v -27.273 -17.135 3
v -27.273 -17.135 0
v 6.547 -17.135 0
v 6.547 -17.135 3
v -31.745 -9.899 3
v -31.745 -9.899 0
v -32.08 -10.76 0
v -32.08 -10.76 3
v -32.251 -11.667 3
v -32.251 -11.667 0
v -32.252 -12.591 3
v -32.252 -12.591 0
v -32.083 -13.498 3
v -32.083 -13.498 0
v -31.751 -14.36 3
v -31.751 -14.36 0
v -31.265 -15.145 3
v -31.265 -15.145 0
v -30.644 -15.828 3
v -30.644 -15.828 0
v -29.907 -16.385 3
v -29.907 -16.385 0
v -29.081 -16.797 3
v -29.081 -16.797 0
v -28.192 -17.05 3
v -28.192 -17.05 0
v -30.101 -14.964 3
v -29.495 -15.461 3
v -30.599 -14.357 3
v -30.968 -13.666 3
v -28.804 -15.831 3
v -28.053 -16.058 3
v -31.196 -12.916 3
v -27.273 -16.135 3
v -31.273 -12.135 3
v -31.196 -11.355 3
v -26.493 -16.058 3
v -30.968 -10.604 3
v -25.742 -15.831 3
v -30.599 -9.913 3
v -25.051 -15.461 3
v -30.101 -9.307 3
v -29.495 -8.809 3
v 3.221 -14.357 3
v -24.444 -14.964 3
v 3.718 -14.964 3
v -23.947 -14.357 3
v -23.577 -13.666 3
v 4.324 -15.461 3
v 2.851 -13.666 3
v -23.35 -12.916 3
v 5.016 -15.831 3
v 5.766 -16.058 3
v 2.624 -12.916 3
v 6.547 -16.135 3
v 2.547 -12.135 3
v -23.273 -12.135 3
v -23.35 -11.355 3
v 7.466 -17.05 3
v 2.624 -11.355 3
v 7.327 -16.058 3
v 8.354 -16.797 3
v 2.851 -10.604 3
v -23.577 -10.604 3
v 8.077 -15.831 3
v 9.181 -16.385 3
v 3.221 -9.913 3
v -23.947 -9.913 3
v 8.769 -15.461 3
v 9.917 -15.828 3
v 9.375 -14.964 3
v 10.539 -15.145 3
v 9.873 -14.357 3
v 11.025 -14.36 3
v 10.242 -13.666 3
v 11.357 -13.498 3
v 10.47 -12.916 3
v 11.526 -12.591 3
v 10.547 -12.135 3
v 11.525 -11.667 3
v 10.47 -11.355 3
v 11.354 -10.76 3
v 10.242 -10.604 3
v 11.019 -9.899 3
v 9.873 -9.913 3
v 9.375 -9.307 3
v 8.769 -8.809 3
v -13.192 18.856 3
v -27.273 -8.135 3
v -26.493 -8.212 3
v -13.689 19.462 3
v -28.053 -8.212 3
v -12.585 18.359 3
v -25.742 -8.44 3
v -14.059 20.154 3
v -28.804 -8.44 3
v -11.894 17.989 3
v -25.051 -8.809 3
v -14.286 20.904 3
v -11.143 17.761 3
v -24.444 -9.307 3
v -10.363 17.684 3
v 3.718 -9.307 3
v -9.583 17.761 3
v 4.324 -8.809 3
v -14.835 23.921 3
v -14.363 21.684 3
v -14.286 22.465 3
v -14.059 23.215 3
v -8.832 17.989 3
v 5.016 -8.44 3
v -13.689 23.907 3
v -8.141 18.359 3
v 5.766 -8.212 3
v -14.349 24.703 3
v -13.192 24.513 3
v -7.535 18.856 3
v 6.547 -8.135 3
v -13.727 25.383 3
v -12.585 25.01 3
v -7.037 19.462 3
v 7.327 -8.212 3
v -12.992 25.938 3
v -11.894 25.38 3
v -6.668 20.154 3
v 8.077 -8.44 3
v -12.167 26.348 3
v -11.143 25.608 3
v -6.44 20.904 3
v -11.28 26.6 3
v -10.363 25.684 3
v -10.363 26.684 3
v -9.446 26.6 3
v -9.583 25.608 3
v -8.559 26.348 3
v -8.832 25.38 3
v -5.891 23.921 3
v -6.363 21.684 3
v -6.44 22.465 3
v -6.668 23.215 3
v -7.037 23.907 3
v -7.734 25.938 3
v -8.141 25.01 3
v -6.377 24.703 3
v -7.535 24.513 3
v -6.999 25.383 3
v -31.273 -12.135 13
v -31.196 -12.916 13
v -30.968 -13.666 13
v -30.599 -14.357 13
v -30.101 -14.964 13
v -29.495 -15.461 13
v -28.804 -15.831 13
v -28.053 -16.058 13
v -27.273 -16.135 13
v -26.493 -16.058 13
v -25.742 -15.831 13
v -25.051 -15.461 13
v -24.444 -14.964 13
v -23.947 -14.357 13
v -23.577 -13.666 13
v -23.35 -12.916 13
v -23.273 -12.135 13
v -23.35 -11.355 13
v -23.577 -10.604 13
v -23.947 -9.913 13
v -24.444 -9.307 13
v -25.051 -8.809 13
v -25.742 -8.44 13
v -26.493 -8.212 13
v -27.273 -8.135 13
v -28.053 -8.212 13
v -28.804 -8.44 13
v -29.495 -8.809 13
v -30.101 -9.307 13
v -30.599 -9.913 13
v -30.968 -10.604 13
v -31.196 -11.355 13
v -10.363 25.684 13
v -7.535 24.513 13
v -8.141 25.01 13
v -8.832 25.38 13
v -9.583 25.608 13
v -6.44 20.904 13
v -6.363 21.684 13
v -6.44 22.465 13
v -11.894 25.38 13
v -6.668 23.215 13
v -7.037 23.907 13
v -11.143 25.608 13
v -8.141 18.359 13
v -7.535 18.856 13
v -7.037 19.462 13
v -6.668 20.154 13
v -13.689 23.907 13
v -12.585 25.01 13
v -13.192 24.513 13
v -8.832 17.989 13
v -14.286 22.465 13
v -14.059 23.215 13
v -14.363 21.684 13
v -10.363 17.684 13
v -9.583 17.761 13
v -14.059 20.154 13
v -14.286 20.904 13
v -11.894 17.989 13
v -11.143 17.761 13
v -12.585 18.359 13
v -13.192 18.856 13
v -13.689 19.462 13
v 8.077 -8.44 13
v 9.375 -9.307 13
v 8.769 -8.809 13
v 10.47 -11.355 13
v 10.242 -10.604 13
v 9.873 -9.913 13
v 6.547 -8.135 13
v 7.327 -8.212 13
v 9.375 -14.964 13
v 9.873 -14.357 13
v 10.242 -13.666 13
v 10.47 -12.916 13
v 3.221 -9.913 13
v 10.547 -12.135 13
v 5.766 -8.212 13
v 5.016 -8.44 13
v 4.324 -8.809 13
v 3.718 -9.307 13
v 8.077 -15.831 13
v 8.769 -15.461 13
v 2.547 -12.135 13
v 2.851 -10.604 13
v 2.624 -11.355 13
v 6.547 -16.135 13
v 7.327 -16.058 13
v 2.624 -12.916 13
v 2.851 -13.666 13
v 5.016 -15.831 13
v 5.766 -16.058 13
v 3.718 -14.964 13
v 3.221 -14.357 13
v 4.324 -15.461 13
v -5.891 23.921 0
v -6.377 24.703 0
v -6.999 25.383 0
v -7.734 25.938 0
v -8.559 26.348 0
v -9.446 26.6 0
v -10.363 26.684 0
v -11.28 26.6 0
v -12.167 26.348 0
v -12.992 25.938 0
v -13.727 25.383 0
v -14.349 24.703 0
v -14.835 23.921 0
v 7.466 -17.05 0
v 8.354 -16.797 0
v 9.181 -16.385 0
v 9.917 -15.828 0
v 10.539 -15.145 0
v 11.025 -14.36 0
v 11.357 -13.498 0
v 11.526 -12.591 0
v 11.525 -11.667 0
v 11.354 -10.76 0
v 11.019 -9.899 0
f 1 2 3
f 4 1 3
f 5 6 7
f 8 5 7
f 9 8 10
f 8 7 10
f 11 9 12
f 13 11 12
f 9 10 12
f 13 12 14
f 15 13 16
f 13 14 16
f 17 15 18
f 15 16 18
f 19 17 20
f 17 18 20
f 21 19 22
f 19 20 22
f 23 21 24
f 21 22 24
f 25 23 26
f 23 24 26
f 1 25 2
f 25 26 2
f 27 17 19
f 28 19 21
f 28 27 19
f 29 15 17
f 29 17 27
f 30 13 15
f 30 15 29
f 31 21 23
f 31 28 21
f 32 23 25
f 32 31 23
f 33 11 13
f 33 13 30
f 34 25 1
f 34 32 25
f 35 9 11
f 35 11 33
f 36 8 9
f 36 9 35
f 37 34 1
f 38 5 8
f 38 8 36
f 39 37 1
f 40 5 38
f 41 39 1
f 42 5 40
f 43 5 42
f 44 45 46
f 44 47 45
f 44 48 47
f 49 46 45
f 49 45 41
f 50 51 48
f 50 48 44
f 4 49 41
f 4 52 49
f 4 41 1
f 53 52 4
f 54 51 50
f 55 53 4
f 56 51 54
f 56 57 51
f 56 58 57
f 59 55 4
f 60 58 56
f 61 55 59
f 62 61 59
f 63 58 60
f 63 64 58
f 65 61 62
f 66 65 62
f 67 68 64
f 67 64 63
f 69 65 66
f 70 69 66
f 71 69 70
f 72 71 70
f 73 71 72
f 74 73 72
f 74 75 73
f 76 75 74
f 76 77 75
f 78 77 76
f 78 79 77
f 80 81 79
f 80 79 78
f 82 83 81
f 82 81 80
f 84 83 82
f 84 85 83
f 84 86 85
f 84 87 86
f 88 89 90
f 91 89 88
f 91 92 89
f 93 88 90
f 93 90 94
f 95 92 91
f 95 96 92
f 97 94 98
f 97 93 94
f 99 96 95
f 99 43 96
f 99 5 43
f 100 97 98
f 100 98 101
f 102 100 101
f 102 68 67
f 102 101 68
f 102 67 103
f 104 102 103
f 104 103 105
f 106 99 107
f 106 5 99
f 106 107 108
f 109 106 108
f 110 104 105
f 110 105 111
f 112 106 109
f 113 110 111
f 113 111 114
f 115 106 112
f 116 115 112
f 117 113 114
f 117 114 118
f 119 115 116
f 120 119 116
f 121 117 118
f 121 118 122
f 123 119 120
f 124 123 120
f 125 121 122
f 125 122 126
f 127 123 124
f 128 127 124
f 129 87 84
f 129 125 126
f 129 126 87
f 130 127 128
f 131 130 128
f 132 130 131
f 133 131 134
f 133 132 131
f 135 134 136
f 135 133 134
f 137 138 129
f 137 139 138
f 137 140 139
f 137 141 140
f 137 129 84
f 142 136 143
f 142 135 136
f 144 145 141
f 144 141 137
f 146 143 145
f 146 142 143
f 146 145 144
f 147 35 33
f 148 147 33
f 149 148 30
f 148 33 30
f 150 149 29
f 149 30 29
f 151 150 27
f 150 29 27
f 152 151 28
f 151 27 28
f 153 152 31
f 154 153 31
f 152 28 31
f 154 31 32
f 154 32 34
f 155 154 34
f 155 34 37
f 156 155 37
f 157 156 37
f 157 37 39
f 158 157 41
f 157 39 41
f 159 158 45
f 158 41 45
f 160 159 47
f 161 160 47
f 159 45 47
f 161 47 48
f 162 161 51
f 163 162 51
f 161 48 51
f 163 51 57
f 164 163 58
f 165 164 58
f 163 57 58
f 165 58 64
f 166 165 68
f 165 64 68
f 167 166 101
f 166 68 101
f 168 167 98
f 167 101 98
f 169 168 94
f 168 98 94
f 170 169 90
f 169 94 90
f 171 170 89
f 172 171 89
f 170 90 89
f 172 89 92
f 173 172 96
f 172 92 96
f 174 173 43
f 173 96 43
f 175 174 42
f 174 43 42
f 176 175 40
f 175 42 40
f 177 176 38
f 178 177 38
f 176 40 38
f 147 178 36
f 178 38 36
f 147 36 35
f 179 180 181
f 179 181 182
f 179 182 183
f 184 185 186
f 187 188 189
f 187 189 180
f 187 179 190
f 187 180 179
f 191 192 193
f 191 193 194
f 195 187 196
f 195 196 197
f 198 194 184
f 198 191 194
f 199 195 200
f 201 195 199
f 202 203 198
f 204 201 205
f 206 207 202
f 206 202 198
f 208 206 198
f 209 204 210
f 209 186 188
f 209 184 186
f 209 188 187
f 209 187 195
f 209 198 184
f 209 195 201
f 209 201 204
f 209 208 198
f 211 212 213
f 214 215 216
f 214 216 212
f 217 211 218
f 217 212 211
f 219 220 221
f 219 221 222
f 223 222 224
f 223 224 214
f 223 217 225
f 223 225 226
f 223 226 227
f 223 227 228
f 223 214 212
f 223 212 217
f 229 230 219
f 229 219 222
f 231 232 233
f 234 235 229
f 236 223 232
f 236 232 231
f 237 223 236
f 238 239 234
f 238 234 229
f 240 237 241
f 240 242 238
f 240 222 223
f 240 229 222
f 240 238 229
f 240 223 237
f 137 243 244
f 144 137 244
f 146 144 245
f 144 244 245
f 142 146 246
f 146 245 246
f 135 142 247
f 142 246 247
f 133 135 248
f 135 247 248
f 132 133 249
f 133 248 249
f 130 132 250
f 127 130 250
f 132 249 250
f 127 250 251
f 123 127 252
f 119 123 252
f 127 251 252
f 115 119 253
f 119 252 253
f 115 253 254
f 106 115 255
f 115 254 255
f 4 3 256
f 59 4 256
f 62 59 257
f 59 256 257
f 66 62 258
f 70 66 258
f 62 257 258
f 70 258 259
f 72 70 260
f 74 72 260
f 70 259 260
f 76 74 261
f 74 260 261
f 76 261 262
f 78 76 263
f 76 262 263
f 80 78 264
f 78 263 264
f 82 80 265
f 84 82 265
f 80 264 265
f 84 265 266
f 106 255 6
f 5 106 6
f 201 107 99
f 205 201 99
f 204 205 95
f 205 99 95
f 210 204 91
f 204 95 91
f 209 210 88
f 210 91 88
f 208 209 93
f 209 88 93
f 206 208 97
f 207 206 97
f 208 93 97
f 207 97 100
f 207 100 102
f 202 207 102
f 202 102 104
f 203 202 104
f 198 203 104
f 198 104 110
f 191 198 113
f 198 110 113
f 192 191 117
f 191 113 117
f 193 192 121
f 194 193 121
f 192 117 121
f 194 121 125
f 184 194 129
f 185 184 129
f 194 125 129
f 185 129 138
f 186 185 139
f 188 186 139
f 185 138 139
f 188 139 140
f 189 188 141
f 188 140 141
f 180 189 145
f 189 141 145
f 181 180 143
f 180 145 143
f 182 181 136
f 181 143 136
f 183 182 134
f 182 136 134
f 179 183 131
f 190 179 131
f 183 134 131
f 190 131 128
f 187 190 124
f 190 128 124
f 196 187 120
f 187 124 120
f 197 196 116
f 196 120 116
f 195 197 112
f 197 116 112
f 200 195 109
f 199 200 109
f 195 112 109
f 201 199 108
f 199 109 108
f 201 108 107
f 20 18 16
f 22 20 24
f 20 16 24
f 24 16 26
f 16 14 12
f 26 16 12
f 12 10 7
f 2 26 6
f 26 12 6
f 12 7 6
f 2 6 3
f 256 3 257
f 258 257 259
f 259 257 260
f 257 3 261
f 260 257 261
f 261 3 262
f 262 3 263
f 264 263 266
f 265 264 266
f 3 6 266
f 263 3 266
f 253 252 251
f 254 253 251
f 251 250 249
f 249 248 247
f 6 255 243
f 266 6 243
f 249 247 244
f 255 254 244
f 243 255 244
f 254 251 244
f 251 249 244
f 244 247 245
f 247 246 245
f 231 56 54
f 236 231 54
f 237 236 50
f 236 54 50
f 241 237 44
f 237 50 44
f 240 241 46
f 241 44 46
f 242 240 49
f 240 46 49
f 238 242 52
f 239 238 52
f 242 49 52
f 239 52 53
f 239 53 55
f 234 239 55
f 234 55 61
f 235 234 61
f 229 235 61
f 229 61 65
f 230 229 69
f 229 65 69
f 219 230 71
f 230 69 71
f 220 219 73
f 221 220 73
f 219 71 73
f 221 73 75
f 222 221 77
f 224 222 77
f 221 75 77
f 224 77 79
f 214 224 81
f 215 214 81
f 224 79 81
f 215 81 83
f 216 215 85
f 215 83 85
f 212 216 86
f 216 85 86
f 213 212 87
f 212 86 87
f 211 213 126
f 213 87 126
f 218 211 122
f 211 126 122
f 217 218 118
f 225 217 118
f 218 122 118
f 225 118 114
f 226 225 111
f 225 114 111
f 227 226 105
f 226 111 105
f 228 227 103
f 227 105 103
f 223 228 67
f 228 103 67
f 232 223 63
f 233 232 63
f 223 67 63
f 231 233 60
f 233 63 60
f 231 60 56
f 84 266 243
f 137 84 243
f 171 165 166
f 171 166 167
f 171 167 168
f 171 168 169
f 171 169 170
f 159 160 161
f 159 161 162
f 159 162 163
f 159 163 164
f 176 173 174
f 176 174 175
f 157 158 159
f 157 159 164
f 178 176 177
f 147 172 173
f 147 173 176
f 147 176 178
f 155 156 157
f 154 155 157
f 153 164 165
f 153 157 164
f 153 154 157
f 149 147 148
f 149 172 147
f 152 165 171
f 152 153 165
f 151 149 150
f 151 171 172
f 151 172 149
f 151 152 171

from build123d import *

# Parameters (mm, degrees)
SALIENTE_EXTRUIR1_DEPTH = 3
CROQUIS2_R              = 4
SALIENTE_EXTRUIR2_DEPTH = 10


with BuildPart() as part:
    # Croquis1 → Saliente-Extruir1 (new body)
    with BuildSketch(Plane.XY):
        with BuildLine():
            Line((-27.272909543, -17.135189149), (6.546750569, -17.135189149))
            ThreePointArc((6.546750569, -17.135189149), (10.800004611, -14.76384471), (11.018886524, -9.899121172))
            Line((11.018886524, -9.899121172), (-5.890943532, 23.920538941))
            ThreePointArc((-5.890943532, 23.920538941), (-10.363079487, 26.684470963), (-14.835215442, 23.920538941))
            Line((-14.835215442, 23.920538941), (-31.745045498, -9.899121172))
            ThreePointArc((-31.745045498, -9.899121172), (-31.526163585, -14.76384471), (-27.272909543, -17.135189149))
        make_face()
    extrude(amount=SALIENTE_EXTRUIR1_DEPTH)

    # Croquis2 → Saliente-Extruir2 (add)
    with BuildSketch(Plane.XY.offset(3)):
        with Locations(Location((-10.363079487, 21.684470963, 0), (0, 0, 180))):
            Circle(CROQUIS2_R)
        with Locations(Location((-27.272909543, -12.135189149, 0), (0, 0, 180))):
            Circle(CROQUIS2_R)
        with Locations(Location((6.546750569, -12.135189149, 0), (0, 0, 180))):
            Circle(CROQUIS2_R)
    extrude(amount=SALIENTE_EXTRUIR2_DEPTH)


solid = part.part
